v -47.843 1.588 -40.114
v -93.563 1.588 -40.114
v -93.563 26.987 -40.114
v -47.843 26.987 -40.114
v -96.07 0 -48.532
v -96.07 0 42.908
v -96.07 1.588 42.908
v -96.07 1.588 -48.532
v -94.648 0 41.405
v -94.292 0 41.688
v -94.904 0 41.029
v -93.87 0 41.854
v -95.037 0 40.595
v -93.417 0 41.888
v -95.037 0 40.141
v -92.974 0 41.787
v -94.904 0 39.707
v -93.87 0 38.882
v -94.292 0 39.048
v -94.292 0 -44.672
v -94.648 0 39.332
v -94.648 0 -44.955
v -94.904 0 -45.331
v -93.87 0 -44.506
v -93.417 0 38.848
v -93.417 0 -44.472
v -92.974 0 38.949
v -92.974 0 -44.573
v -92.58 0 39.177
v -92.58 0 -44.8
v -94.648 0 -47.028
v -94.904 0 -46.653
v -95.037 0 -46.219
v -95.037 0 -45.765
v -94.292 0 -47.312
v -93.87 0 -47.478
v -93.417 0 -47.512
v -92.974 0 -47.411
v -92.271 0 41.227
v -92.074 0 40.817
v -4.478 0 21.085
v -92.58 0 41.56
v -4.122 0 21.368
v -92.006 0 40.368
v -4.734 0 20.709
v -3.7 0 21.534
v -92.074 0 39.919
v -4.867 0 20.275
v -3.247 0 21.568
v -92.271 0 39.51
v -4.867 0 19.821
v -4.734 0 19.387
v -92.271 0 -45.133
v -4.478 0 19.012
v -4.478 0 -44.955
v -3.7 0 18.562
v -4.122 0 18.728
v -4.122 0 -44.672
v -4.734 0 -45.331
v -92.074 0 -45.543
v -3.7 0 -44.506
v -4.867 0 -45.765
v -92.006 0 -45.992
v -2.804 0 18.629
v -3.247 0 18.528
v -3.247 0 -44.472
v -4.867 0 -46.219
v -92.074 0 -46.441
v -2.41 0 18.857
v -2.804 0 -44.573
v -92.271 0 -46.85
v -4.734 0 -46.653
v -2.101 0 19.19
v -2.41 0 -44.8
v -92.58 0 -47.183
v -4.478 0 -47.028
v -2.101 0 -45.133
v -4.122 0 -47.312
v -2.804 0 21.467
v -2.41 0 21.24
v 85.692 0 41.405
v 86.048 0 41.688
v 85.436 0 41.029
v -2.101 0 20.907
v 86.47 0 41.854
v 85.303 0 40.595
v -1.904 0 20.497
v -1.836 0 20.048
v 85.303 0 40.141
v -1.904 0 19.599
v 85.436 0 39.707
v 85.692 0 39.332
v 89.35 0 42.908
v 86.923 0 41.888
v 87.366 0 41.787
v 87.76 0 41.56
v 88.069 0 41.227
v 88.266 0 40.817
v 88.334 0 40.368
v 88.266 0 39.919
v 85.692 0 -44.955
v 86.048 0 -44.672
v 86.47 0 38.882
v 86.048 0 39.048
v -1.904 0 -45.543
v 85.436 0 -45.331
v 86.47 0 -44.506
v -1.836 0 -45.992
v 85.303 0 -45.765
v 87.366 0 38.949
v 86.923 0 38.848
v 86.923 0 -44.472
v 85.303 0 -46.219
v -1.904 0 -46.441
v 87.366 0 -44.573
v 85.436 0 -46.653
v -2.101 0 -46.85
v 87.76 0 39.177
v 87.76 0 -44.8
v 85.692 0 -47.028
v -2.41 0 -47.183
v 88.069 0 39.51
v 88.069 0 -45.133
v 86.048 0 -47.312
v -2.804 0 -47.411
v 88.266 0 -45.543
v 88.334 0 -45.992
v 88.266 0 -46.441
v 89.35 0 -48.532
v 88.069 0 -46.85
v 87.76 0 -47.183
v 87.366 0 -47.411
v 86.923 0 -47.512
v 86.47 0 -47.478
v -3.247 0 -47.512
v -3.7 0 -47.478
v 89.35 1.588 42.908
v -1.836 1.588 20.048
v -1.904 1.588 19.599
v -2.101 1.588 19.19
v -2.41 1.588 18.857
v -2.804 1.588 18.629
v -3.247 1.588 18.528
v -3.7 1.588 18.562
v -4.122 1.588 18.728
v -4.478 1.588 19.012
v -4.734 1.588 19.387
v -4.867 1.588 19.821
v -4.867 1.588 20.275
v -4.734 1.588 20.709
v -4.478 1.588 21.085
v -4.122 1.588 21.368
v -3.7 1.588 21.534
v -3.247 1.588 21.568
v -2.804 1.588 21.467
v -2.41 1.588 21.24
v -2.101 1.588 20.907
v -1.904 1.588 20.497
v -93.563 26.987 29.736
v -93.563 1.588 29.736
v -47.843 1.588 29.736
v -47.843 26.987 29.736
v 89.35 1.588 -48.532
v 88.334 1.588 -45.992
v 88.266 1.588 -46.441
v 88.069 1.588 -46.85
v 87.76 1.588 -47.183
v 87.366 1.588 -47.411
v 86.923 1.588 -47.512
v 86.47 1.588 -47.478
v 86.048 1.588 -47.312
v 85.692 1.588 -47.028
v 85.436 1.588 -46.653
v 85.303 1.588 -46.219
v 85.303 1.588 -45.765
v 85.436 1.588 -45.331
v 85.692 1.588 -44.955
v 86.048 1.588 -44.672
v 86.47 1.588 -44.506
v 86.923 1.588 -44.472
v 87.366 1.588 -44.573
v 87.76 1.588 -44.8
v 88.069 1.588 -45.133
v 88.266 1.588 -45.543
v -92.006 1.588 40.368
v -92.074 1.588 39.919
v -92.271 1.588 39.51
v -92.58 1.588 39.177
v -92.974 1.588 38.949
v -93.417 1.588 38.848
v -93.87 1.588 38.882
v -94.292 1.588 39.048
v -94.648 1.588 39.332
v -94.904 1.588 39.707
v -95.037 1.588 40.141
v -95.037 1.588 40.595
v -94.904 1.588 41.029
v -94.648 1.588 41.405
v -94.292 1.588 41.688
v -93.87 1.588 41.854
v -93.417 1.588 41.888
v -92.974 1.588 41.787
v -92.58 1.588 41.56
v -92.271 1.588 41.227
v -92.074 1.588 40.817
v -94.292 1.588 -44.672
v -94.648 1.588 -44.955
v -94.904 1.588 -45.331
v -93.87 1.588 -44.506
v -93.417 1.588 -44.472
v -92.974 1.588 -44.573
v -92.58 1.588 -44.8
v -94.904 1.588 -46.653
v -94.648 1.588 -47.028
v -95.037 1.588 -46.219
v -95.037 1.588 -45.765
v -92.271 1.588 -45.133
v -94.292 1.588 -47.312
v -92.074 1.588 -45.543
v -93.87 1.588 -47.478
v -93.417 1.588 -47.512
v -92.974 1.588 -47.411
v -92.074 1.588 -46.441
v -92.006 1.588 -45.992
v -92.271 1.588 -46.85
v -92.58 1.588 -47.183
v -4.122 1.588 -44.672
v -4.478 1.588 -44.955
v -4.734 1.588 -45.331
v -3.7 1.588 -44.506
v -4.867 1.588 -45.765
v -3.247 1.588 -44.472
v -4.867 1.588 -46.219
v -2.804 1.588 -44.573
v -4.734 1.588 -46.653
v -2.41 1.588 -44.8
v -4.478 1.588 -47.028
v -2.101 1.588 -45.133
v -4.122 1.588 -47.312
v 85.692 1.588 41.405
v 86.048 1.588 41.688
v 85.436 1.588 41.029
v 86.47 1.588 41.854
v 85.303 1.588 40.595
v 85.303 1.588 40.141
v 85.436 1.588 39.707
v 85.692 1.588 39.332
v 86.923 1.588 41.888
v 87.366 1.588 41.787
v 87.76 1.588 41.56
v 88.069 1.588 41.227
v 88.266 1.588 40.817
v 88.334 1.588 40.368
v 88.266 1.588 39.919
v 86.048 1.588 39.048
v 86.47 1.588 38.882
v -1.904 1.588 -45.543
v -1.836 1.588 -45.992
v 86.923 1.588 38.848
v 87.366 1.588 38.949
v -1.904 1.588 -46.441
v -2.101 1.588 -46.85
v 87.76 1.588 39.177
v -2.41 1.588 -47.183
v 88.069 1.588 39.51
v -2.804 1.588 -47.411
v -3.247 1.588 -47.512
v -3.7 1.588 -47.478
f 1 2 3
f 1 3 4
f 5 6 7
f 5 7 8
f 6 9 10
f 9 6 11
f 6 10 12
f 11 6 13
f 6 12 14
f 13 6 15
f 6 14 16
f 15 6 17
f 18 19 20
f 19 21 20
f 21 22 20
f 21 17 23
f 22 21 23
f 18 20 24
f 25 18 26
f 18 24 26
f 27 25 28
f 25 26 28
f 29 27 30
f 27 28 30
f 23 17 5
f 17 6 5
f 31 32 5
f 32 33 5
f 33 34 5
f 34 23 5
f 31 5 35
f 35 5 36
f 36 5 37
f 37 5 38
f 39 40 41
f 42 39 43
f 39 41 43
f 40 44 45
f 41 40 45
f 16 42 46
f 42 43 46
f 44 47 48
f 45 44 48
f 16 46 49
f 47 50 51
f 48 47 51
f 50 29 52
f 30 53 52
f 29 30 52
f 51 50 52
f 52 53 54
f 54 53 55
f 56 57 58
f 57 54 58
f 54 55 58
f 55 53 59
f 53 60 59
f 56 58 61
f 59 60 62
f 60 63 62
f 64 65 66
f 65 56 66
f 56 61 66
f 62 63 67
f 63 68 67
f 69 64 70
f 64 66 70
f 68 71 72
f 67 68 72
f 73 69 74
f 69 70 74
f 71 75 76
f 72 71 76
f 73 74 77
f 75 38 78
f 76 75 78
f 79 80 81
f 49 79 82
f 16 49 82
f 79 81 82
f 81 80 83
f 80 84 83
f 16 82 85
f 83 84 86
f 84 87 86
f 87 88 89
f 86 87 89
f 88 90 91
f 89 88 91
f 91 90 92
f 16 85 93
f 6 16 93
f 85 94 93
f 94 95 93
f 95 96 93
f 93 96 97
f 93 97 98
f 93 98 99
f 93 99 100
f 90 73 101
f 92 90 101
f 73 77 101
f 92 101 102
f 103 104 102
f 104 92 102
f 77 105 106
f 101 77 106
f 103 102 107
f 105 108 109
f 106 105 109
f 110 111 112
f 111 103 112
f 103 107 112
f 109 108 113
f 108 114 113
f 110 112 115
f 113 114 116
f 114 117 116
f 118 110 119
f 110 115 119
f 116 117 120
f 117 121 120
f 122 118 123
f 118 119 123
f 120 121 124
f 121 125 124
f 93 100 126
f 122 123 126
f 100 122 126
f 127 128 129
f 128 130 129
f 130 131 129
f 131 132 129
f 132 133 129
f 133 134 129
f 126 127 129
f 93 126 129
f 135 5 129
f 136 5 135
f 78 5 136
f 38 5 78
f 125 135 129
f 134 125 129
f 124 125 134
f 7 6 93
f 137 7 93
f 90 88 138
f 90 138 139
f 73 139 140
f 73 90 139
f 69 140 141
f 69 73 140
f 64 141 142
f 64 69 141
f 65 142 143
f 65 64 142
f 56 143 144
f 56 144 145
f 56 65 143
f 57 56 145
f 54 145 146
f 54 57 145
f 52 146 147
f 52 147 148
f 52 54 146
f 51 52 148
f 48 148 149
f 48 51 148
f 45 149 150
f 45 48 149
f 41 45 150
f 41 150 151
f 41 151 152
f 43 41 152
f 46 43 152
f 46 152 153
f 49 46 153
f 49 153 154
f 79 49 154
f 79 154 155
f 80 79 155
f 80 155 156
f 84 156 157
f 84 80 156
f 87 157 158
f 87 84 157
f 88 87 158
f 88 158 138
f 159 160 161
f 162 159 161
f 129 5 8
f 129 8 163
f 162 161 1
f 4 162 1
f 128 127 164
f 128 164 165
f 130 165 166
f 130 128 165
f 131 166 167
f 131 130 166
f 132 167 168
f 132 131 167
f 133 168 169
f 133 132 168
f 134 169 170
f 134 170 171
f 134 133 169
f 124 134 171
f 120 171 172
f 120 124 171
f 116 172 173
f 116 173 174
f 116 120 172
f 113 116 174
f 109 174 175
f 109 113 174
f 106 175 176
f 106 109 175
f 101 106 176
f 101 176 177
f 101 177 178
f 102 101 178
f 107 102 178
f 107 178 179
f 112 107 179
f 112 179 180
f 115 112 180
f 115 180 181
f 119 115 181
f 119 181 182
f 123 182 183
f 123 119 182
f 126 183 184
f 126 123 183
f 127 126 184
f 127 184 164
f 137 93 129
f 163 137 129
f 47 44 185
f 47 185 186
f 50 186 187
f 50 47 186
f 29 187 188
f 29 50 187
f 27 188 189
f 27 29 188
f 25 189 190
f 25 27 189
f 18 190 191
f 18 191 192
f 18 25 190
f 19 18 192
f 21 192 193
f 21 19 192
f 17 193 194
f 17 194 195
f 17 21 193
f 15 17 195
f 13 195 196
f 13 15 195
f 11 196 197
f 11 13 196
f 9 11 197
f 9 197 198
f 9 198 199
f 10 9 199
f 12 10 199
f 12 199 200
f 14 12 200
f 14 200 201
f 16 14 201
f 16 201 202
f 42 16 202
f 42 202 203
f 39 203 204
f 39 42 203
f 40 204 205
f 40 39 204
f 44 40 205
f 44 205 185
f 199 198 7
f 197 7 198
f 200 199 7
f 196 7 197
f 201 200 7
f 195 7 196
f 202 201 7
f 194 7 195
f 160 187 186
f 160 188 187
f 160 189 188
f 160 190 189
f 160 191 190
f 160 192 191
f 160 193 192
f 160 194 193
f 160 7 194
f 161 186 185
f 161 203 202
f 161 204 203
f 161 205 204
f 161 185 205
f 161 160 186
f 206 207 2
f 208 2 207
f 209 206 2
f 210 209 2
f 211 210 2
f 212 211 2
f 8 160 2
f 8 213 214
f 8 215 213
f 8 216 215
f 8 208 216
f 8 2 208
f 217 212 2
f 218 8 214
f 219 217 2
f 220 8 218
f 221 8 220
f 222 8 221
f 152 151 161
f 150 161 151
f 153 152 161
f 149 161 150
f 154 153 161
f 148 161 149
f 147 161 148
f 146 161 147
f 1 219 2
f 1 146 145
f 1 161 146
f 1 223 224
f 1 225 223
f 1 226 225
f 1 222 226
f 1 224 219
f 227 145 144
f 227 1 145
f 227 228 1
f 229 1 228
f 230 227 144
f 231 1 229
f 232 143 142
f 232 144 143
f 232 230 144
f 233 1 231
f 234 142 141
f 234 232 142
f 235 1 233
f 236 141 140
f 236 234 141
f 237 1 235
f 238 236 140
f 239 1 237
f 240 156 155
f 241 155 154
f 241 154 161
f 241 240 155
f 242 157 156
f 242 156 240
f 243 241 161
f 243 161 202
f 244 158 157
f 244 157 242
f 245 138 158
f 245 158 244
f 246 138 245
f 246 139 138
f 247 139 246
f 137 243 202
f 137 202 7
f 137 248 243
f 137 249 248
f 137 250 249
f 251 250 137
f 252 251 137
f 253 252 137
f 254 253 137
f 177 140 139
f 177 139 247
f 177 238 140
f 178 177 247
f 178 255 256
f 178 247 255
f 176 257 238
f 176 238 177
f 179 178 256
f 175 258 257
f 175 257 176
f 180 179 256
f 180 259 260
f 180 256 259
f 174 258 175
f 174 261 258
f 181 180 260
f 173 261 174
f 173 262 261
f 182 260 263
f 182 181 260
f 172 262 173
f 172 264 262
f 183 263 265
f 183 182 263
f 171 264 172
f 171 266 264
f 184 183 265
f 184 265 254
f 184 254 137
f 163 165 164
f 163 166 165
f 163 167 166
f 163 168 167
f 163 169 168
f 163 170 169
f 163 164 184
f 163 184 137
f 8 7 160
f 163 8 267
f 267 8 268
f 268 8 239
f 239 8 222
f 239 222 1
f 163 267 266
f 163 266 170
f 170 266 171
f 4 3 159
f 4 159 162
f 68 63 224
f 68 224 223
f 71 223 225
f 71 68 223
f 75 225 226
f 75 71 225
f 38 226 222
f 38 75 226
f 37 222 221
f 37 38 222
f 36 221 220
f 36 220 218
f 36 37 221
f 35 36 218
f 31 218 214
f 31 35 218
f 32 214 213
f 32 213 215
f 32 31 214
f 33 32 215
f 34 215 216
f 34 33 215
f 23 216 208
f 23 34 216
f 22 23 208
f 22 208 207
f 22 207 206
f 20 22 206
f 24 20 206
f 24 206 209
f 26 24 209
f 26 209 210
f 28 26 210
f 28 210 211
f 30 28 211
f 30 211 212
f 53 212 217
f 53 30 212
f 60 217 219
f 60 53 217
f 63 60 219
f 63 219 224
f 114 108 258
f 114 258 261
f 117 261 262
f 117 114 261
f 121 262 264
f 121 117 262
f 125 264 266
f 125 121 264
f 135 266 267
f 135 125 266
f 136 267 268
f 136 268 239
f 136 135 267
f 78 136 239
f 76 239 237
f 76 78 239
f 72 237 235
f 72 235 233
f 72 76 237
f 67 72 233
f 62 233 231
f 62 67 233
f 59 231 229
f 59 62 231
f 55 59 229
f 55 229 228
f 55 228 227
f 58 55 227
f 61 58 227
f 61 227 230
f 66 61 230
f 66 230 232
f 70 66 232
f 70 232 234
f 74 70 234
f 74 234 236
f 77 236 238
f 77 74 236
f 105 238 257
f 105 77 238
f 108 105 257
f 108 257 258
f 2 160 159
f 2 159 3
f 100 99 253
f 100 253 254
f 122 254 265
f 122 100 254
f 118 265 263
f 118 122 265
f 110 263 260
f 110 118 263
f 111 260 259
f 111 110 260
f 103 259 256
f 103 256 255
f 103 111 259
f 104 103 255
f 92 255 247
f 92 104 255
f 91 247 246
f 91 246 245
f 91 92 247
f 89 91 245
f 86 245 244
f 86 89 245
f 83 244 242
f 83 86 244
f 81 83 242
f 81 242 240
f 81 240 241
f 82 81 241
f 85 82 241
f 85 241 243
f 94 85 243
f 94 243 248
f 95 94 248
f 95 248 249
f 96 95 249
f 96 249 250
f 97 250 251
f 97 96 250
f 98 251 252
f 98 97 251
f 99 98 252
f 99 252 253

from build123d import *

# Parameters (mm, degrees)
SKETCH1_W           = 185.42
SKETCH1_H           = 91.44
SKETCH1_R           = 1.524
BOSS_EXTRUDE1_DEPTH = 1.5875
SKETCH2_W           = 45.72
SKETCH2_H           = 69.85
BOSS_EXTRUDE2_DEPTH = 25.4


with BuildPart() as part:
    # Sketch1 → Boss-Extrude1 (new body)
    with BuildSketch(Plane(origin=(0, 0, 0), x_dir=(1, 0, 0), z_dir=(0, 1, 0))):
        with Locations((-3.360446214, 2.811906005)):
            Rectangle(SKETCH1_W, SKETCH1_H)
        with Locations((-93.530446214, 45.991906005)):
            Circle(SKETCH1_R, mode=Mode.SUBTRACT)
        with Locations((86.809553786, 45.991906005)):
            Circle(SKETCH1_R, mode=Mode.SUBTRACT)
        with Locations((86.809553786, -40.368093995)):
            Circle(SKETCH1_R, mode=Mode.SUBTRACT)
        with Locations((-93.530446214, -40.368093995)):
            Circle(SKETCH1_R, mode=Mode.SUBTRACT)
        with Locations((-3.360446214, 45.991906005)):
            Circle(SKETCH1_R, mode=Mode.SUBTRACT)
        with Locations((-3.360446214, -20.048093995)):
            Circle(SKETCH1_R, mode=Mode.SUBTRACT)
    extrude(amount=BOSS_EXTRUDE1_DEPTH)

    # Sketch2 → Boss-Extrude2 (add)
    with BuildSketch(Plane(origin=(0, 1.5875, 0), x_dir=(1, 0, 0), z_dir=(0, 1, 0))):
        with Locations((-70.702750799, 5.188938255)):
            Rectangle(SKETCH2_W, SKETCH2_H)
    extrude(amount=BOSS_EXTRUDE2_DEPTH)


solid = part.part
